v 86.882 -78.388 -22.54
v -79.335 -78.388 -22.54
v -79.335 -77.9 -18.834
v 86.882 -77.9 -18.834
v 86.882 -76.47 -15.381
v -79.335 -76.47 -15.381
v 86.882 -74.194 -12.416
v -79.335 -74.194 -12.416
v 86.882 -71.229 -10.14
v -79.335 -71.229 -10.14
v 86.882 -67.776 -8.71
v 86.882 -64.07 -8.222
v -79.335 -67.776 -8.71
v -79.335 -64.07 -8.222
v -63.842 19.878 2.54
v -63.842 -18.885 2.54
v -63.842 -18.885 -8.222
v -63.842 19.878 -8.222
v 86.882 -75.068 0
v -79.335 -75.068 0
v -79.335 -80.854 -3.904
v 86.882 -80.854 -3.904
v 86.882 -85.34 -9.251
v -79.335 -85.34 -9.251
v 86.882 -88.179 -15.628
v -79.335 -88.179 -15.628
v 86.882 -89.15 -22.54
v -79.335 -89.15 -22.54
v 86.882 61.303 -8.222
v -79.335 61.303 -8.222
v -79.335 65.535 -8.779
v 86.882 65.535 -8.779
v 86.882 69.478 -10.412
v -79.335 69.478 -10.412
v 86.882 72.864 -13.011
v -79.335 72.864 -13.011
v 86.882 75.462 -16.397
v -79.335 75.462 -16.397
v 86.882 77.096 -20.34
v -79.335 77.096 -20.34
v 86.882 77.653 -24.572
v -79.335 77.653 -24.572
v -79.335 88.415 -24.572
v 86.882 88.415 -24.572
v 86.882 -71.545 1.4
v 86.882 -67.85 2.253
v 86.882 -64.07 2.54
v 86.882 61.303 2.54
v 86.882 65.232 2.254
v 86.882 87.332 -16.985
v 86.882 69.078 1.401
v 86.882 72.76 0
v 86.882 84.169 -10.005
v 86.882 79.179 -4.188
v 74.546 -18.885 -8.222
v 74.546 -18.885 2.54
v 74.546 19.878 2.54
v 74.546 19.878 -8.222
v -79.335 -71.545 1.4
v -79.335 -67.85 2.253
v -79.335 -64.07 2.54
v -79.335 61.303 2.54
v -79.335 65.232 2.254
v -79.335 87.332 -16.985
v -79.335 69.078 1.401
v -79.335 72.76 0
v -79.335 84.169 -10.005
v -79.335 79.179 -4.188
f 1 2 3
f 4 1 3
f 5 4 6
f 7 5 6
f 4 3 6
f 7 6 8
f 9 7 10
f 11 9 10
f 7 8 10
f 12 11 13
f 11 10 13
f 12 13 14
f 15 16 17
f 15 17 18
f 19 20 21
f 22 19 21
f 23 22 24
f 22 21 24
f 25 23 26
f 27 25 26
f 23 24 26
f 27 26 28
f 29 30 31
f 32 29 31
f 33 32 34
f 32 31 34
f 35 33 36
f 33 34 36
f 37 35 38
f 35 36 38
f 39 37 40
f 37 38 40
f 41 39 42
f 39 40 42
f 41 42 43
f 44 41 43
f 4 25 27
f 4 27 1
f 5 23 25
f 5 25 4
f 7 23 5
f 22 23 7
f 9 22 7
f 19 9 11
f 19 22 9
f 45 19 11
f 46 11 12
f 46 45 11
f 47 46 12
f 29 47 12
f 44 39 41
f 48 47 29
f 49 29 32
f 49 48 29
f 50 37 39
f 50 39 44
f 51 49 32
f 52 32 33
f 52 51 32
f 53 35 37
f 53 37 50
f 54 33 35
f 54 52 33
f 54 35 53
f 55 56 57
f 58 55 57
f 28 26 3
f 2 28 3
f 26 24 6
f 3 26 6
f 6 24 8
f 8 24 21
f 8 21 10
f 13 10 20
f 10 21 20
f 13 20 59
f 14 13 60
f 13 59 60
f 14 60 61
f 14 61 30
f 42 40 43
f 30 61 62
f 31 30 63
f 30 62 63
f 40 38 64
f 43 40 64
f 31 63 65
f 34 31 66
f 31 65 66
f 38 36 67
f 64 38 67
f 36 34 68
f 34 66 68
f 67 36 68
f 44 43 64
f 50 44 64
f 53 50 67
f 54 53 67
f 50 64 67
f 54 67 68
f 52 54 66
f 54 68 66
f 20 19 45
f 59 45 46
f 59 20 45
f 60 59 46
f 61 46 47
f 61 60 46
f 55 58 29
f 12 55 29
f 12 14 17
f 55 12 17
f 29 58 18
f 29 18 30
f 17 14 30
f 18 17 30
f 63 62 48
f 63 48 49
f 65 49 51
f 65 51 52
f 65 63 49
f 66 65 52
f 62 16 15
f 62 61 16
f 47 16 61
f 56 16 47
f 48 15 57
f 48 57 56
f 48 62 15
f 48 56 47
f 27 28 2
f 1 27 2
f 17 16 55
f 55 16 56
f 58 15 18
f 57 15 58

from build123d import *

# Parameters (mm, degrees)
SKETCH1_W              = 166.217523153
SKETCH1_H              = 177.56469515
BOSS_EXTRUDE1_DEPTH    = 2.54
CONVERT_SOLID1_START   = -79.335378531
CONVERT_SOLID1_DEPTH   = 166.217523153
CONVERT_SOLID1_2_DEPTH = 166.217523153
SKETCH9_W              = 138.38791167
SKETCH9_H              = 38.762646995
CUT_EXTRUDE1_DEPTH     = 128.40199345


# Read off the part's stored shape, not the designer's step: Convert-Solid1
with BuildPart() as part:
    # Sketch1 → Boss-Extrude1 (new body)
    with BuildSketch(Plane.XY):
        with Locations((3.773383045, -0.367528123)):
            Rectangle(SKETCH1_W, SKETCH1_H)
    extrude(amount=BOSS_EXTRUDE1_DEPTH)

    # Convert-Solid1 outline → Convert-Solid1 (cut)
    with BuildSketch(Plane.YZ.offset(CONVERT_SOLID1_START)):
        with BuildLine():
            Line((-89.149875698, 0), (-75.067820962, 0))
            ThreePointArc((-75.067820962, 0), (-69.713597874, 1.896751012), (-64.069875698, 2.54))
            Line((-64.069875698, 2.54), (-89.149875698, 2.54))
            Line((-89.149875698, 2.54), (-89.149875698, 0))
        make_face()
        with BuildLine():
            ThreePointArc((61.302819452, 2.54), (67.170718566, 1.897384277), (72.760452717, 0))
            Line((72.760452717, 0), (88.414819452, 0))
            Line((88.414819452, 0), (88.414819452, 2.54))
            Line((88.414819452, 2.54), (61.302819452, 2.54))
        make_face()
    extrude(amount=CONVERT_SOLID1_DEPTH, mode=Mode.SUBTRACT)

    # Convert-Solid1 2 outline → Convert-Solid1 2 (add)
    with BuildSketch(Plane.YZ.offset(CONVERT_SOLID1_START)):
        with BuildLine():
            ThreePointArc((-75.067820962, 0), (-85.339982271, -9.251321871), (-89.149875698, -22.54))
            Line((-89.149875698, -22.54), (-78.387875698, -22.54))
            ThreePointArc((-78.387875698, -22.54), (-74.194230592, -12.415645107), (-64.069875698, -8.222))
            Line((-64.069875698, -8.222), (61.302819452, -8.222))
            ThreePointArc((61.302819452, -8.222), (72.864015325, -13.010804128), (77.652819452, -24.572))
            Line((77.652819452, -24.572), (88.414819452, -24.572))
            ThreePointArc((88.414819452, -24.572), (84.168731823, -10.004550138), (72.760452717, 0))
            Line((72.760452717, 0), (-75.067820962, 0))
        make_face()
    extrude(amount=CONVERT_SOLID1_2_DEPTH)

    # Sketch9 → Cut-Extrude1 (cut, through all)
    with BuildSketch(Plane.XY.offset(2.54)):
        with Locations((5.35195238, 0.49679134)):
            Rectangle(SKETCH9_W, SKETCH9_H)
    extrude(amount=-CUT_EXTRUDE1_DEPTH, mode=Mode.SUBTRACT)


solid = part.part
